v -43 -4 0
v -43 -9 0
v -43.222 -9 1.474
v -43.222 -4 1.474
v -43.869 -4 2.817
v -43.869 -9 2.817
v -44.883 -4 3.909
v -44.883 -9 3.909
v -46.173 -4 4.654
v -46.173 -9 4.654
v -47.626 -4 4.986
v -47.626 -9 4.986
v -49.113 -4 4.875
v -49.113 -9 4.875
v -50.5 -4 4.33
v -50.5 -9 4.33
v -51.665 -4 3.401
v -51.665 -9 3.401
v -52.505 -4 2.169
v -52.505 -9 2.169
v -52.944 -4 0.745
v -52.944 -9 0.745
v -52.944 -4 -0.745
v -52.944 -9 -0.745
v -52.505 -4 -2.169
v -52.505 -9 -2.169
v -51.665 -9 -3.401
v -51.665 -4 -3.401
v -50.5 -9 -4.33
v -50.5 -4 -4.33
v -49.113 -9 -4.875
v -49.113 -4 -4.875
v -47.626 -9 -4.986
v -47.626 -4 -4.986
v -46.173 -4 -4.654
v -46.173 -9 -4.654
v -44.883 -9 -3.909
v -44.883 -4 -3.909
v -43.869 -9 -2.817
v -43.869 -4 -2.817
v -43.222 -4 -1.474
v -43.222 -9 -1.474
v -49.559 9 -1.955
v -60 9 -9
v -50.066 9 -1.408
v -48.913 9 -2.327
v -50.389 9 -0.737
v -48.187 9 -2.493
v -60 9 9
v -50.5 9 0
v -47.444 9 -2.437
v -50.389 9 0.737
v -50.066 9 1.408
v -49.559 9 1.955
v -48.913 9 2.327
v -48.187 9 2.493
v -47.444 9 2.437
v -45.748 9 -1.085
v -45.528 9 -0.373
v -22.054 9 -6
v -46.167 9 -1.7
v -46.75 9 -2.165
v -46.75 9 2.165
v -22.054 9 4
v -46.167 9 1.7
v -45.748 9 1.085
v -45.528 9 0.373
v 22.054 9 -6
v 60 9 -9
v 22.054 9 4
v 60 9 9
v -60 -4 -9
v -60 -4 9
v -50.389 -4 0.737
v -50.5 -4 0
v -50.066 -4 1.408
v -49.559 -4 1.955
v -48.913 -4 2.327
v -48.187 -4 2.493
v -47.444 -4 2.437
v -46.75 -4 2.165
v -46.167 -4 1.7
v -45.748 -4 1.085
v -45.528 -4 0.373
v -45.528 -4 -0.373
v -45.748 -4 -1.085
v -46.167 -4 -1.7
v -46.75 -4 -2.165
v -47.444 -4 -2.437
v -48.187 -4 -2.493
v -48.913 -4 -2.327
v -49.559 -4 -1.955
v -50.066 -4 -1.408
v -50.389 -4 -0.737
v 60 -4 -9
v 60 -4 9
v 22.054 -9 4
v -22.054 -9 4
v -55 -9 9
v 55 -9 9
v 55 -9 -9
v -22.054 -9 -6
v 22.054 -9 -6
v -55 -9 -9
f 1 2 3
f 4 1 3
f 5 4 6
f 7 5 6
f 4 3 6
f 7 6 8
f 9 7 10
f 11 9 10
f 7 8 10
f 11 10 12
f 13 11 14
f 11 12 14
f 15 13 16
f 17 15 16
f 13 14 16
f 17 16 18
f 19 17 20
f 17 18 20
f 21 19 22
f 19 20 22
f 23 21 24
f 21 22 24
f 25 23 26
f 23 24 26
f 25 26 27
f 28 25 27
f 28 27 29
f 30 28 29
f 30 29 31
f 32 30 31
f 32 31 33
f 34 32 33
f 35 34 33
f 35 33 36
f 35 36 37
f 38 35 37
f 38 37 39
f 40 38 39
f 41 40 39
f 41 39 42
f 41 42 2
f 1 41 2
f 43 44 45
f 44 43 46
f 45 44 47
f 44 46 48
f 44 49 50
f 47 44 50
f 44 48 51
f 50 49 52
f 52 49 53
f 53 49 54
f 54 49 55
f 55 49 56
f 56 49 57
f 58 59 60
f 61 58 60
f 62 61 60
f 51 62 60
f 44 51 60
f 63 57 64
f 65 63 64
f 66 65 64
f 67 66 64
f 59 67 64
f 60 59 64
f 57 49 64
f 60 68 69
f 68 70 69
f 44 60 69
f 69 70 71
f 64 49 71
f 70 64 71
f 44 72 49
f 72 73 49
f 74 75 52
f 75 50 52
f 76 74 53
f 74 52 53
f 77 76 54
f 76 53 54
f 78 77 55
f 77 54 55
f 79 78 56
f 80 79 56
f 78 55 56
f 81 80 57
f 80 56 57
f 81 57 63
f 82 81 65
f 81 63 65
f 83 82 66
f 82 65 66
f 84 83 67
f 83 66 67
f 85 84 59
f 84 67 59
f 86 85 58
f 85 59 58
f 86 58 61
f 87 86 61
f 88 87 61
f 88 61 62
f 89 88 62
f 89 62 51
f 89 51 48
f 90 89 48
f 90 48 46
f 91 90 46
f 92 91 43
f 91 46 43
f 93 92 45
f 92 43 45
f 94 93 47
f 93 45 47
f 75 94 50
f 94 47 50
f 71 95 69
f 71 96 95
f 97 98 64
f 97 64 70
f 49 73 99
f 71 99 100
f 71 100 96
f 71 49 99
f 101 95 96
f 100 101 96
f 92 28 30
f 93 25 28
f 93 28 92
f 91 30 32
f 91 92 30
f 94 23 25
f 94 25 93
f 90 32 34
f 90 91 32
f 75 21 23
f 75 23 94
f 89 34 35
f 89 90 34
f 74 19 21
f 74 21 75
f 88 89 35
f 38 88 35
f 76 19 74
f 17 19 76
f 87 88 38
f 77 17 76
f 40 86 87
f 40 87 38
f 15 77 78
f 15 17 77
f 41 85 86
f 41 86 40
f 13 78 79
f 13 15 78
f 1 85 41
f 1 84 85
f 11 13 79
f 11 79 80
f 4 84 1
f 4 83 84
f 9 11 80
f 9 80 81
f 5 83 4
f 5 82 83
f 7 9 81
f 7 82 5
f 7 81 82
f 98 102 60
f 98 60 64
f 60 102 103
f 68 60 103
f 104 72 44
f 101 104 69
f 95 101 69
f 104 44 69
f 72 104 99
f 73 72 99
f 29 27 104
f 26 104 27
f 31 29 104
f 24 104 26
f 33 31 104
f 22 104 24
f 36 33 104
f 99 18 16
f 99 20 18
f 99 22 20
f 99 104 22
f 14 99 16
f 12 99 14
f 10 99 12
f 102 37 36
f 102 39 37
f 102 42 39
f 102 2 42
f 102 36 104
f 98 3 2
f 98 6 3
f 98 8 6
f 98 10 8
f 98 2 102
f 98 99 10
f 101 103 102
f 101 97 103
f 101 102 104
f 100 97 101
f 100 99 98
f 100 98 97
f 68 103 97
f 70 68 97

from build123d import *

# Parameters (mm, degrees)
F0_W           = 120
F0_H           = 18
F1_DEPTH       = 9
F2_W           = 44.108732
F2_H           = 10
F3_DEPTH       = 25
F5_D           = 5
F5_CBORE_D     = 10
F5_CBORE_DEPTH = 5
F6_SIZE        = 5


with BuildPart() as f1:
    # F0 (on Top) → F1 (new body, symmetric)
    with BuildSketch(Plane.XY):
        Rectangle(F0_W, F0_H)
    extrude(amount=F1_DEPTH, both=True)

    # F2 (on face) → F3 (cut)
    with BuildSketch(Plane.XZ.offset(9)):
        with Locations((0, -1)):
            Rectangle(F2_W, F2_H)
    extrude(amount=-F3_DEPTH, mode=Mode.SUBTRACT)

    # F5 (through all)
    with Locations(Plane.XZ.offset(9)):
        with Locations((-48, 0)):
            CounterBoreHole(F5_D / 2, F5_CBORE_D / 2, F5_CBORE_DEPTH)

    # F6
    f6_edges = [f1.edges().sort_by_distance(p)[0] for p in [
        (60, -9, 0),
        (-60, -9, 0),
    ]]
    chamfer(f6_edges, length=F6_SIZE)


solid = f1.part
